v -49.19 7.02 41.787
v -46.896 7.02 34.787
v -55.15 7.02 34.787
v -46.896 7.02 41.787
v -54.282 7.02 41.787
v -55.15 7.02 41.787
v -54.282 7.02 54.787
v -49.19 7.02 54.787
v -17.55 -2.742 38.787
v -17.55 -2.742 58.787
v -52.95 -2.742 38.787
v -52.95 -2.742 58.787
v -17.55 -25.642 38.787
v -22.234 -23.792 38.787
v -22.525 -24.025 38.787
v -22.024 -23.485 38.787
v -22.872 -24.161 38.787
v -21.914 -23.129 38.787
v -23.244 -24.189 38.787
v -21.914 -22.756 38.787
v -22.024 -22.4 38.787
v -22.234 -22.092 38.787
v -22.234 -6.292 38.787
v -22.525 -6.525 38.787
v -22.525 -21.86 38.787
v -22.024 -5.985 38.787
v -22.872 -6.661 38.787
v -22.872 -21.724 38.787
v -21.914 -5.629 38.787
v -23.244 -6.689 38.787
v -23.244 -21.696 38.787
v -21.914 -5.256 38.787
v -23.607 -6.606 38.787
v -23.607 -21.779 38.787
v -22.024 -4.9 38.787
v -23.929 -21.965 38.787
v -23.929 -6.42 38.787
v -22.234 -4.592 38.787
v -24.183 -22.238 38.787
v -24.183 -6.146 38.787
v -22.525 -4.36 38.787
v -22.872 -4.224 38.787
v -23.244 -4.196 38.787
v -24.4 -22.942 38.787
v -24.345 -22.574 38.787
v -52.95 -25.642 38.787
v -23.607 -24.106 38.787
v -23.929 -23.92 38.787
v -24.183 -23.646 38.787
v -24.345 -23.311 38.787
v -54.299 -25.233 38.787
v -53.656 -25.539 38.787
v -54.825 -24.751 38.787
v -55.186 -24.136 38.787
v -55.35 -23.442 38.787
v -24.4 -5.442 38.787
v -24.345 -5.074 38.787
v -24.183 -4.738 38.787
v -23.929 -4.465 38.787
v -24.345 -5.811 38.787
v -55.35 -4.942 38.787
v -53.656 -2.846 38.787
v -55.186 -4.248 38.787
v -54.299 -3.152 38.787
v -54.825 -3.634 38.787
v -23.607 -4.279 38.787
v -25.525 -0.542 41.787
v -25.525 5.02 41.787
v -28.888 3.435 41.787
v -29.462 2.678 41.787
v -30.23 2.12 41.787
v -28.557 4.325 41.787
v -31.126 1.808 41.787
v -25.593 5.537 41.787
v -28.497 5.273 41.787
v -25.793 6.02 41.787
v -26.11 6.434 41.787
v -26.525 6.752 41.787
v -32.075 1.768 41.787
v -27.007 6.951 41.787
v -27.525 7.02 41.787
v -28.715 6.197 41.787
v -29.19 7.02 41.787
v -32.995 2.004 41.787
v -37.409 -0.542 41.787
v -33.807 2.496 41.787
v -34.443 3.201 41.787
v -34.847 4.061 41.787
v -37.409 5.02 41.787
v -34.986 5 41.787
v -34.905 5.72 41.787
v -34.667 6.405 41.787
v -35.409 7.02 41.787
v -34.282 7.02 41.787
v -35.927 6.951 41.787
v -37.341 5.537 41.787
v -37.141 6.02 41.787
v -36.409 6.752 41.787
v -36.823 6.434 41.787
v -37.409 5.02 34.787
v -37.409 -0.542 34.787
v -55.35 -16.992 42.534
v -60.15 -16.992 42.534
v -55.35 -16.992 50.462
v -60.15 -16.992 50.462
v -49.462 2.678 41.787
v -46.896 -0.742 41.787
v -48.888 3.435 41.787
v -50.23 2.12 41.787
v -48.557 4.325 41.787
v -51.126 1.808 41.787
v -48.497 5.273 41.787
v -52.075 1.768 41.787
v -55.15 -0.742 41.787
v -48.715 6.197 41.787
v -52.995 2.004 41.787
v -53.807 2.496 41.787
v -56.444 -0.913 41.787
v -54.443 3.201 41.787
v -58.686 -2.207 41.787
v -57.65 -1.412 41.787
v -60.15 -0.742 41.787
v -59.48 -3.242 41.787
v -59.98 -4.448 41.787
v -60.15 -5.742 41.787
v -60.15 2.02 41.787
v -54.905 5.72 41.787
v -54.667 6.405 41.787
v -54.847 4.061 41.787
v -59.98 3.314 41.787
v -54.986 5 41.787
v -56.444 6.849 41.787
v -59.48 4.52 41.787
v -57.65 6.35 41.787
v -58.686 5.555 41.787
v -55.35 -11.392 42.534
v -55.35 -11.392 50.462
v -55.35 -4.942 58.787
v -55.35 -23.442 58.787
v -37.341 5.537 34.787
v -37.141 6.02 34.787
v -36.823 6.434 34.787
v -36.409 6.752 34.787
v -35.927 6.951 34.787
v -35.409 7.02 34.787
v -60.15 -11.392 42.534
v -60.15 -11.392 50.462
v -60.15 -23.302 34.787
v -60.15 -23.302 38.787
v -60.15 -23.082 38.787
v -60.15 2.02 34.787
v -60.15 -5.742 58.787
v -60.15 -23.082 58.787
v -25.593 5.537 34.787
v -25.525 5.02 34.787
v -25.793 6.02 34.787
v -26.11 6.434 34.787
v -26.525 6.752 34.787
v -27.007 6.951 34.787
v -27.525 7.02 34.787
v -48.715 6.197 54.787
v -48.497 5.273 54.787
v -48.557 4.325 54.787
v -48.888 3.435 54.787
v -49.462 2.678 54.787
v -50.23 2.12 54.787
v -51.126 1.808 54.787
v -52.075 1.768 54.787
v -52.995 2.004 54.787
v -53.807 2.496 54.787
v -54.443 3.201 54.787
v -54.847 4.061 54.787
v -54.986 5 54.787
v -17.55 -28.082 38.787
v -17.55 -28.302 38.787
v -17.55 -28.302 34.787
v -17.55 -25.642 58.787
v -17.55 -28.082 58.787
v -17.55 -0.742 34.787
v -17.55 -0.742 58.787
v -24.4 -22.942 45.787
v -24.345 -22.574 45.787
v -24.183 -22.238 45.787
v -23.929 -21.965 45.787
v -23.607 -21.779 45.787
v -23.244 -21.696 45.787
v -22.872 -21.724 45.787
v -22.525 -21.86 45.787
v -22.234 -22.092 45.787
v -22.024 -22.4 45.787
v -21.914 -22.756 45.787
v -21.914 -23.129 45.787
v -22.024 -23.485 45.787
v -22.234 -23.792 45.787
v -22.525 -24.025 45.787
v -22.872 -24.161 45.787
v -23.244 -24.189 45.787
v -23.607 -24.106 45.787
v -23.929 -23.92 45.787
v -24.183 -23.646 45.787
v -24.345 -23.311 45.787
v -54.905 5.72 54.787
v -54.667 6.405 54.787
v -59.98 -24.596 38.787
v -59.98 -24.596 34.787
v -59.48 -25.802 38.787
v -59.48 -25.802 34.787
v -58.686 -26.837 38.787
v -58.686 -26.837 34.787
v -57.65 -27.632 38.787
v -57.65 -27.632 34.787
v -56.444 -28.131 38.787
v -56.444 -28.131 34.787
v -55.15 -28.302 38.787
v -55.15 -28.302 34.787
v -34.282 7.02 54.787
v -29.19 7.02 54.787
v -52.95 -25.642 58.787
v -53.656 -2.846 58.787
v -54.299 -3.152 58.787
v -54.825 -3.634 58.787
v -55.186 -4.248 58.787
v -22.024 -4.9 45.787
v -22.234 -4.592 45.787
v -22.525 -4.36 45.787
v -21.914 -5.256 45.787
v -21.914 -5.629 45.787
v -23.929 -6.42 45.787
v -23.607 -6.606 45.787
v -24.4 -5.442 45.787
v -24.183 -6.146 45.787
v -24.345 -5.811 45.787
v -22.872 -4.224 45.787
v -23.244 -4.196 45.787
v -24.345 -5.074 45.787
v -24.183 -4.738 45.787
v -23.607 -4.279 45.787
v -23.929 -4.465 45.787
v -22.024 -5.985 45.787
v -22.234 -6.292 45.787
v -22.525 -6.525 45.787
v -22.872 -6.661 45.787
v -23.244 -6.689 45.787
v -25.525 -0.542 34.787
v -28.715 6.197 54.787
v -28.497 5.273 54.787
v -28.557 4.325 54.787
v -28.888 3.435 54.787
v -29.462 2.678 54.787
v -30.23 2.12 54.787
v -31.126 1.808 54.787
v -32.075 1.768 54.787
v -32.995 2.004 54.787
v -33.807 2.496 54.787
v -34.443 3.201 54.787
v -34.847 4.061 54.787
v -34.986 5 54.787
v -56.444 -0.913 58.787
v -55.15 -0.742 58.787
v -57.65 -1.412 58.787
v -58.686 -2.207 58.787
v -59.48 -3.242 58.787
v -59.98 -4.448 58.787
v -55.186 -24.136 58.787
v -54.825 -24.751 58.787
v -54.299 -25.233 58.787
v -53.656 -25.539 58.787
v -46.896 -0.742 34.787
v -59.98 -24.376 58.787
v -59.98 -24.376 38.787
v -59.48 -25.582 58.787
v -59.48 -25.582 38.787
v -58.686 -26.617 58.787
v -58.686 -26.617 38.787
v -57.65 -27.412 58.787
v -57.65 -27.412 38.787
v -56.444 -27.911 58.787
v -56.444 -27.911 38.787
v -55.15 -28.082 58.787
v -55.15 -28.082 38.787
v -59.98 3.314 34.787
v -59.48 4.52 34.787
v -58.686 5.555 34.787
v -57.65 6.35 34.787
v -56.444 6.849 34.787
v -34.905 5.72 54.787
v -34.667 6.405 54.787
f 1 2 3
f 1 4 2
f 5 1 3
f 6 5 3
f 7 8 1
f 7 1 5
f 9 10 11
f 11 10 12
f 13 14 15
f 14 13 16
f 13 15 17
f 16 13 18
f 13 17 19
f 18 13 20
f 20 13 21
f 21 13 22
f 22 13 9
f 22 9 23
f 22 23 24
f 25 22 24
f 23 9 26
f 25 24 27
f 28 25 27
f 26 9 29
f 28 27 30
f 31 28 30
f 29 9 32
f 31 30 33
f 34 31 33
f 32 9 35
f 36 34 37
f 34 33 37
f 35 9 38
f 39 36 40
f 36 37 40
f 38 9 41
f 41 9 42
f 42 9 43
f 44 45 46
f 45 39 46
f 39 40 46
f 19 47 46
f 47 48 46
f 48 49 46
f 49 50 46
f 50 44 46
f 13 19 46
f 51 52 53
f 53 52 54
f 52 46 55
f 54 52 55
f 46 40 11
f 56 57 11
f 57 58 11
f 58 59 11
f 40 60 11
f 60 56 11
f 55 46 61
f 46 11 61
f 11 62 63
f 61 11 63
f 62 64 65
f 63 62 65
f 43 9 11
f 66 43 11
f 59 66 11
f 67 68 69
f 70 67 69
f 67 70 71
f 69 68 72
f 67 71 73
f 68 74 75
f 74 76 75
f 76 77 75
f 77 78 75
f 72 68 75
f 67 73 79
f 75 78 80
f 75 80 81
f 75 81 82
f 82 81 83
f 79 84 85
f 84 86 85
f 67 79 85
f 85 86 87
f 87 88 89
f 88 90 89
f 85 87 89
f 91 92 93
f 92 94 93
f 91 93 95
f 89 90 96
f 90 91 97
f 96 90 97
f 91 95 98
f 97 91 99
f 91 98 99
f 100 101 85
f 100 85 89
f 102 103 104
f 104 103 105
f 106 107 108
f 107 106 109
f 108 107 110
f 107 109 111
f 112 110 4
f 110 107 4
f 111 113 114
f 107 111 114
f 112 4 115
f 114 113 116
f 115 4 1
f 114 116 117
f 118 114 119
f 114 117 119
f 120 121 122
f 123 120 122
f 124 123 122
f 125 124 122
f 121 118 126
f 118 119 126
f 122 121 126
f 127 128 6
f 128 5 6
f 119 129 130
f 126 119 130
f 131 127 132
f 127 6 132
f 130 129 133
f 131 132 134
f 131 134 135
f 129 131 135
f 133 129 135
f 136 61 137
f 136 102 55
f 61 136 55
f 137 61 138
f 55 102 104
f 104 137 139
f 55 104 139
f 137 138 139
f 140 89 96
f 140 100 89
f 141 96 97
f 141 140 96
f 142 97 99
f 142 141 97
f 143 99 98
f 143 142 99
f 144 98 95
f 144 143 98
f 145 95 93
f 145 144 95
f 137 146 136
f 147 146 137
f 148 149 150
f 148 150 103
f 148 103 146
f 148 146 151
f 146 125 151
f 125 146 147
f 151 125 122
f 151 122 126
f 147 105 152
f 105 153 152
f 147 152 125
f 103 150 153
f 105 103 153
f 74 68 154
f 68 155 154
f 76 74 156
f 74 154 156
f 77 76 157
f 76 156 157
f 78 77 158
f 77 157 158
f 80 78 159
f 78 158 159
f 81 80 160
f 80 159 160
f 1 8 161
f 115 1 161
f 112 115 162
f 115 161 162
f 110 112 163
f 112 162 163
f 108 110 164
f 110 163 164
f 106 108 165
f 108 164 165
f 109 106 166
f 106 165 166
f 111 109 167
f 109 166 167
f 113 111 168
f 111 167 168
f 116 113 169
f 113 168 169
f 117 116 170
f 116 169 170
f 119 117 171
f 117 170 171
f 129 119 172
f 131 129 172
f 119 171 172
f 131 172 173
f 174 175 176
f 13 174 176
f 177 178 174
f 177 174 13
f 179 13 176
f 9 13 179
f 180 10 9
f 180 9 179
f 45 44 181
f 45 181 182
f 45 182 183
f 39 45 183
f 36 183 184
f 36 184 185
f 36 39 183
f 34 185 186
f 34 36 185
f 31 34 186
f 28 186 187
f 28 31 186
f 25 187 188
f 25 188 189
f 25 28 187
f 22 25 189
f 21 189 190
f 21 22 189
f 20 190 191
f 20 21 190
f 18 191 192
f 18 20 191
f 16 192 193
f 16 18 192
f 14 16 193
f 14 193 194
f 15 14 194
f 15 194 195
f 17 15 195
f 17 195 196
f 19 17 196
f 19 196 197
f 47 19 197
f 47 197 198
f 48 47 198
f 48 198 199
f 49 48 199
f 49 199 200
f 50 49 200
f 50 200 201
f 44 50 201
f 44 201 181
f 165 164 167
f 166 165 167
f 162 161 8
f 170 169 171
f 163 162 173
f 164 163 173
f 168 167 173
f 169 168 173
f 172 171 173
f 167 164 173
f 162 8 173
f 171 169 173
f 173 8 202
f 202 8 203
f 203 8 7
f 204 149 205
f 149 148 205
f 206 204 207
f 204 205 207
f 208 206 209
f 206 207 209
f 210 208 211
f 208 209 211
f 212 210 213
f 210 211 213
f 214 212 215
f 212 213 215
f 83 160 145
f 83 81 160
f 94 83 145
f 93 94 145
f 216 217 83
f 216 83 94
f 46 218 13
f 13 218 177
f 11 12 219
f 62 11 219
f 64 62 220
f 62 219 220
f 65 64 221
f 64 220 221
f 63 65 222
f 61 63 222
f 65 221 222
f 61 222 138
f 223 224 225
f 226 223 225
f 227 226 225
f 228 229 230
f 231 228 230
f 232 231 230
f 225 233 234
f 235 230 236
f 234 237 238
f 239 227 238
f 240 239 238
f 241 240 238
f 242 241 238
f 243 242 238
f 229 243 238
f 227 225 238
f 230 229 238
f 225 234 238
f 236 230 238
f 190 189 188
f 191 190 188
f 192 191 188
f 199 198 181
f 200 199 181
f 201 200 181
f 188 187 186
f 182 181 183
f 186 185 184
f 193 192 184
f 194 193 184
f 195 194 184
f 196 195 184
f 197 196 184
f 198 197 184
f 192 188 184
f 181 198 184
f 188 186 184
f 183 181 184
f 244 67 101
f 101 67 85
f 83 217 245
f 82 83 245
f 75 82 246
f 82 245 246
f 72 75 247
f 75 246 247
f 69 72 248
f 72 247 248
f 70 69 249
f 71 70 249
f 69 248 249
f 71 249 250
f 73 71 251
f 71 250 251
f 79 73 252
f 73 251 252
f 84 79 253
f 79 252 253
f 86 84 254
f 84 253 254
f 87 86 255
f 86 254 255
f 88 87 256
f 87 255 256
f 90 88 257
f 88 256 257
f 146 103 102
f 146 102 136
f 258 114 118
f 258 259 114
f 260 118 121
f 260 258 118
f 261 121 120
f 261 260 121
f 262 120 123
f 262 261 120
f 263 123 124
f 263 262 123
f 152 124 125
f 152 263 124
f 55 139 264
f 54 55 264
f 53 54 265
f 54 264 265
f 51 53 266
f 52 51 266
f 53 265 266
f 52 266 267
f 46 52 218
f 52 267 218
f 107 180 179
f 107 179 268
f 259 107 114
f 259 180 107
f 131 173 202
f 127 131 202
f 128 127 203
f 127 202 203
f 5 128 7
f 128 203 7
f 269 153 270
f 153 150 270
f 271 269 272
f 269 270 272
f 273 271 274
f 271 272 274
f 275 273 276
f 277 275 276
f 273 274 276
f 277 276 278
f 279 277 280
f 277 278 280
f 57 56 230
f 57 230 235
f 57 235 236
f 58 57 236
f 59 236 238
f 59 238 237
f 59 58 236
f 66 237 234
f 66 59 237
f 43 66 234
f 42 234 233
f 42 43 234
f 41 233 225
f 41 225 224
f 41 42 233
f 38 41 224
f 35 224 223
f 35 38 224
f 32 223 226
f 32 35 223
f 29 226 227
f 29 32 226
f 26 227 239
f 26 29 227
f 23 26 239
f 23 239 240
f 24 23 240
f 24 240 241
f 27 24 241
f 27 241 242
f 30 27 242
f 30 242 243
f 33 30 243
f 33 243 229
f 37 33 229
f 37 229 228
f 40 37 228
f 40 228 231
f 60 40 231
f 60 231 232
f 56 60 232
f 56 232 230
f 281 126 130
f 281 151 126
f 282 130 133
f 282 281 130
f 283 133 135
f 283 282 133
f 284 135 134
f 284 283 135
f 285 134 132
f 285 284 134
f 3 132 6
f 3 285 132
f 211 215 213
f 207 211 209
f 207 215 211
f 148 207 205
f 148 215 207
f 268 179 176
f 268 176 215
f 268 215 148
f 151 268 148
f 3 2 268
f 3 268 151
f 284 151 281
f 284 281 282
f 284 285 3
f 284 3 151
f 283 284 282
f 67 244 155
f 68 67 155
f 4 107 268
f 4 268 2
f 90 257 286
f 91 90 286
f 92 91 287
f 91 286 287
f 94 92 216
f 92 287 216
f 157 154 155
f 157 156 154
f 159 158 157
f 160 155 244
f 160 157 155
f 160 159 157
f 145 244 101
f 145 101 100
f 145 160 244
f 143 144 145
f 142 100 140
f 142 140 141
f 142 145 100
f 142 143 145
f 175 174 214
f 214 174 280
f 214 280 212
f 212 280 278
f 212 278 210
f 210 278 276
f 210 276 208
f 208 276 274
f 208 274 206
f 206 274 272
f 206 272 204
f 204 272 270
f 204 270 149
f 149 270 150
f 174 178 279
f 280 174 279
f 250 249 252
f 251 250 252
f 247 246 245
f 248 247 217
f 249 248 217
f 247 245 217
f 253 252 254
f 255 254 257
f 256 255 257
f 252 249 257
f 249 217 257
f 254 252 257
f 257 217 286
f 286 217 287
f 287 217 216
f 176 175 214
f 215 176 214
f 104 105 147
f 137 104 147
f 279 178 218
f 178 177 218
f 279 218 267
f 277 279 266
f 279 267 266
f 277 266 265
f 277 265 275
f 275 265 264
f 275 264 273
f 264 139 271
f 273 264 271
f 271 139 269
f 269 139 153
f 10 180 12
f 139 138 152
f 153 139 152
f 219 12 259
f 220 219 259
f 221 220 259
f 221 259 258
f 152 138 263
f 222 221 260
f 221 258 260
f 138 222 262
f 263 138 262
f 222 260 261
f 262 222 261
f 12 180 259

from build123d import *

# Parameters (mm, degrees)
BOSS_EXTRUDE1_DEPTH        = 2
BOSS_EXTRUDE1_DEPTH_BACK   = 11
BOSS_EXTRUDE1_2_DEPTH      = 2
BOSS_EXTRUDE1_2_DEPTH_BACK = 11
BOSS_EXTRUDE2_DEPTH        = 3
BOSS_EXTRUDE2_DEPTH_BACK   = 17
SKETCH3_W                  = 7.92818374
SKETCH3_H                  = 5.6
CUT_EXTRUDE1_DEPTH         = 5
SKETCH4_W                  = 42.6
SKETCH4_H                  = 27.559288912
SKETCH4_R                  = 1.25
BOSS_EXTRUDE3_DEPTH        = 4
SKETCH5_R                  = 1.25
BOSS_EXTRUDE4_DEPTH        = 11
SKETCH6_W                  = 11.884357557
SKETCH6_H                  = 7.561849503
SKETCH6_W_2                = 13.253647929
SKETCH6_H_2                = 7.761849503
BOSS_EXTRUDE5_DEPTH        = 7
FILLET1_R                  = 5
FILLET2_R                  = 5
FILLET3_R                  = 5
FILLET4_R                  = 2


with BuildPart() as part:
    # Sketch1 → Boss-Extrude1 (new, two sides: drawn at the far end of the back side and taken through both)
    with BuildSketch(Plane(origin=(0, 0, 43.786654763), x_dir=(-1, 0, 0), z_dir=(0, 0, -1)).offset(-BOSS_EXTRUDE1_DEPTH_BACK)):
        with BuildLine():
            ThreePointArc((34.985984859, 5), (34.805023511, 6.069346414), (34.282291473, 7.019609524))
            Line((34.282291473, 7.019609524), (29.189678246, 7.019609524))
            ThreePointArc((29.189678246, 7.019609524), (30.666638445, 1.930961348), (34.985984859, 5))
        make_face()
    extrude(amount=BOSS_EXTRUDE1_DEPTH + BOSS_EXTRUDE1_DEPTH_BACK)



with BuildPart() as body_2:
    # Sketch1 → Boss-Extrude1 2 (new, two sides: drawn at the far end of the back side and taken through both)
    with BuildSketch(Plane(origin=(0, 0, 43.786654763), x_dir=(-1, 0, 0), z_dir=(0, 0, -1)).offset(-BOSS_EXTRUDE1_2_DEPTH_BACK)):
        with BuildLine():
            Line((54.282291473, 7.019609524), (49.189678246, 7.019609524))
            ThreePointArc((49.189678246, 7.019609524), (50.666638445, 1.930961348), (54.985984859, 5))
            ThreePointArc((54.985984859, 5), (54.805023511, 6.069346414), (54.282291473, 7.019609524))
        make_face()
    extrude(amount=BOSS_EXTRUDE1_2_DEPTH + BOSS_EXTRUDE1_2_DEPTH_BACK)


with BuildPart() as body_3:
    # Sketch2 → Boss-Extrude2 (new, two sides: drawn at the far end of the back side and taken through both)
    with BuildSketch(Plane(origin=(0, 0, 41.786654763), x_dir=(-1, 0, 0), z_dir=(0, 0, -1)).offset(-BOSS_EXTRUDE2_DEPTH_BACK)):
        with BuildLine():
            Line((55.350131717, -4.942239979), (55.350131717, -23.442239979))
            ThreePointArc((55.350131717, -23.442239979), (54.580217463, -25.01142443), (52.950131717, -25.642239979))
            Line((52.950131717, -25.642239979), (17.550131717, -25.642239979))
            Line((17.550131717, -25.642239979), (17.550131717, -28.081825493))
            Line((17.550131717, -28.081825493), (60.150131717, -28.081825493))
            Line((60.150131717, -28.081825493), (60.150131717, -0.742239979))
            Line((60.150131717, -0.742239979), (17.550131717, -0.742239979))
            Line((17.550131717, -0.742239979), (17.550131717, -2.742239979))
            Line((17.550131717, -2.742239979), (52.950131717, -2.742239979))
            ThreePointArc((52.950131717, -2.742239979), (54.580217463, -3.373055529), (55.350131717, -4.942239979))
        make_face()
    extrude(amount=BOSS_EXTRUDE2_DEPTH + BOSS_EXTRUDE2_DEPTH_BACK)

    # Sketch3 → Cut-Extrude1 (cut)
    with BuildSketch(Plane.ZY.offset(60.150131717)):
        with Locations((46.497736517, -14.192239979)):
            Rectangle(SKETCH3_W, SKETCH3_H)
    extrude(amount=-CUT_EXTRUDE1_DEPTH, mode=Mode.SUBTRACT)

    # Sketch4 → Boss-Extrude3 (add)
    with BuildSketch(Plane(origin=(0, 0, 38.786654763), x_dir=(-1, 0, 0), z_dir=(0, 0, -1))):
        with Locations((38.850131717, -14.521884435)):
            Rectangle(SKETCH4_W, SKETCH4_H)
        with Locations((23.150131717, -5.442239979)):
            Circle(SKETCH4_R, mode=Mode.SUBTRACT)
        with Locations((23.150131717, -22.942239979)):
            Circle(SKETCH4_R, mode=Mode.SUBTRACT)
    extrude(amount=BOSS_EXTRUDE3_DEPTH)

    # Sketch5 → Boss-Extrude4 (add)
    with BuildSketch(Plane(origin=(0, 0, 34.786654763), x_dir=(-1, 0, 0), z_dir=(0, 0, -1))):
        with Locations((23.150131717, -5.442239979)):
            Circle(SKETCH5_R)
        with Locations((23.150131717, -22.942239979)):
            Circle(SKETCH5_R)
    extrude(amount=-BOSS_EXTRUDE4_DEPTH)


with BuildPart() as part_1:
    add(part.part)

    add(body_2.part)  # Boss-Extrude5 merges body 2

    add(body_3.part)  # Boss-Extrude5 merges body 3
    # Sketch6 → Boss-Extrude5 (add)
    with BuildSketch(Plane(origin=(0, 0, 41.786654763), x_dir=(-1, 0, 0), z_dir=(0, 0, -1))):
        with Locations((31.466833118, 3.238684773)):
            Rectangle(SKETCH6_W, SKETCH6_H)
        with Locations((53.523307753, 3.138684773)):
            Rectangle(SKETCH6_W_2, SKETCH6_H_2)
    extrude(amount=BOSS_EXTRUDE5_DEPTH)

    # Fillet1
    fillet1_edges = [part_1.edges().sort_by_distance(p)[0] for p in [
        (-60.150131717, -28.081825493, 48.786654763),
        (-60.150131717, -0.742239979, 50.286654763),
    ]]
    fillet(fillet1_edges, radius=FILLET1_R)

    # Fillet2
    fillet2_edges = [part_1.edges().sort_by_distance(p)[0] for p in [
        (-60.150131717, -28.301528891, 36.786654763),
    ]]
    fillet(fillet2_edges, radius=FILLET2_R)

    # Fillet3
    fillet3_edges = [part_1.edges().sort_by_distance(p)[0] for p in [
        (-60.150131717, 7.019609524, 38.286654763),
    ]]
    fillet(fillet3_edges, radius=FILLET3_R)

    # Fillet4
    fillet4_edges = [part_1.edges().sort_by_distance(p)[0] for p in [
        (-37.409011897, 7.019609524, 38.286654763),
        (-25.52465434, 7.019609524, 38.286654763),
    ]]
    fillet(fillet4_edges, radius=FILLET4_R)


solid = part_1.part
